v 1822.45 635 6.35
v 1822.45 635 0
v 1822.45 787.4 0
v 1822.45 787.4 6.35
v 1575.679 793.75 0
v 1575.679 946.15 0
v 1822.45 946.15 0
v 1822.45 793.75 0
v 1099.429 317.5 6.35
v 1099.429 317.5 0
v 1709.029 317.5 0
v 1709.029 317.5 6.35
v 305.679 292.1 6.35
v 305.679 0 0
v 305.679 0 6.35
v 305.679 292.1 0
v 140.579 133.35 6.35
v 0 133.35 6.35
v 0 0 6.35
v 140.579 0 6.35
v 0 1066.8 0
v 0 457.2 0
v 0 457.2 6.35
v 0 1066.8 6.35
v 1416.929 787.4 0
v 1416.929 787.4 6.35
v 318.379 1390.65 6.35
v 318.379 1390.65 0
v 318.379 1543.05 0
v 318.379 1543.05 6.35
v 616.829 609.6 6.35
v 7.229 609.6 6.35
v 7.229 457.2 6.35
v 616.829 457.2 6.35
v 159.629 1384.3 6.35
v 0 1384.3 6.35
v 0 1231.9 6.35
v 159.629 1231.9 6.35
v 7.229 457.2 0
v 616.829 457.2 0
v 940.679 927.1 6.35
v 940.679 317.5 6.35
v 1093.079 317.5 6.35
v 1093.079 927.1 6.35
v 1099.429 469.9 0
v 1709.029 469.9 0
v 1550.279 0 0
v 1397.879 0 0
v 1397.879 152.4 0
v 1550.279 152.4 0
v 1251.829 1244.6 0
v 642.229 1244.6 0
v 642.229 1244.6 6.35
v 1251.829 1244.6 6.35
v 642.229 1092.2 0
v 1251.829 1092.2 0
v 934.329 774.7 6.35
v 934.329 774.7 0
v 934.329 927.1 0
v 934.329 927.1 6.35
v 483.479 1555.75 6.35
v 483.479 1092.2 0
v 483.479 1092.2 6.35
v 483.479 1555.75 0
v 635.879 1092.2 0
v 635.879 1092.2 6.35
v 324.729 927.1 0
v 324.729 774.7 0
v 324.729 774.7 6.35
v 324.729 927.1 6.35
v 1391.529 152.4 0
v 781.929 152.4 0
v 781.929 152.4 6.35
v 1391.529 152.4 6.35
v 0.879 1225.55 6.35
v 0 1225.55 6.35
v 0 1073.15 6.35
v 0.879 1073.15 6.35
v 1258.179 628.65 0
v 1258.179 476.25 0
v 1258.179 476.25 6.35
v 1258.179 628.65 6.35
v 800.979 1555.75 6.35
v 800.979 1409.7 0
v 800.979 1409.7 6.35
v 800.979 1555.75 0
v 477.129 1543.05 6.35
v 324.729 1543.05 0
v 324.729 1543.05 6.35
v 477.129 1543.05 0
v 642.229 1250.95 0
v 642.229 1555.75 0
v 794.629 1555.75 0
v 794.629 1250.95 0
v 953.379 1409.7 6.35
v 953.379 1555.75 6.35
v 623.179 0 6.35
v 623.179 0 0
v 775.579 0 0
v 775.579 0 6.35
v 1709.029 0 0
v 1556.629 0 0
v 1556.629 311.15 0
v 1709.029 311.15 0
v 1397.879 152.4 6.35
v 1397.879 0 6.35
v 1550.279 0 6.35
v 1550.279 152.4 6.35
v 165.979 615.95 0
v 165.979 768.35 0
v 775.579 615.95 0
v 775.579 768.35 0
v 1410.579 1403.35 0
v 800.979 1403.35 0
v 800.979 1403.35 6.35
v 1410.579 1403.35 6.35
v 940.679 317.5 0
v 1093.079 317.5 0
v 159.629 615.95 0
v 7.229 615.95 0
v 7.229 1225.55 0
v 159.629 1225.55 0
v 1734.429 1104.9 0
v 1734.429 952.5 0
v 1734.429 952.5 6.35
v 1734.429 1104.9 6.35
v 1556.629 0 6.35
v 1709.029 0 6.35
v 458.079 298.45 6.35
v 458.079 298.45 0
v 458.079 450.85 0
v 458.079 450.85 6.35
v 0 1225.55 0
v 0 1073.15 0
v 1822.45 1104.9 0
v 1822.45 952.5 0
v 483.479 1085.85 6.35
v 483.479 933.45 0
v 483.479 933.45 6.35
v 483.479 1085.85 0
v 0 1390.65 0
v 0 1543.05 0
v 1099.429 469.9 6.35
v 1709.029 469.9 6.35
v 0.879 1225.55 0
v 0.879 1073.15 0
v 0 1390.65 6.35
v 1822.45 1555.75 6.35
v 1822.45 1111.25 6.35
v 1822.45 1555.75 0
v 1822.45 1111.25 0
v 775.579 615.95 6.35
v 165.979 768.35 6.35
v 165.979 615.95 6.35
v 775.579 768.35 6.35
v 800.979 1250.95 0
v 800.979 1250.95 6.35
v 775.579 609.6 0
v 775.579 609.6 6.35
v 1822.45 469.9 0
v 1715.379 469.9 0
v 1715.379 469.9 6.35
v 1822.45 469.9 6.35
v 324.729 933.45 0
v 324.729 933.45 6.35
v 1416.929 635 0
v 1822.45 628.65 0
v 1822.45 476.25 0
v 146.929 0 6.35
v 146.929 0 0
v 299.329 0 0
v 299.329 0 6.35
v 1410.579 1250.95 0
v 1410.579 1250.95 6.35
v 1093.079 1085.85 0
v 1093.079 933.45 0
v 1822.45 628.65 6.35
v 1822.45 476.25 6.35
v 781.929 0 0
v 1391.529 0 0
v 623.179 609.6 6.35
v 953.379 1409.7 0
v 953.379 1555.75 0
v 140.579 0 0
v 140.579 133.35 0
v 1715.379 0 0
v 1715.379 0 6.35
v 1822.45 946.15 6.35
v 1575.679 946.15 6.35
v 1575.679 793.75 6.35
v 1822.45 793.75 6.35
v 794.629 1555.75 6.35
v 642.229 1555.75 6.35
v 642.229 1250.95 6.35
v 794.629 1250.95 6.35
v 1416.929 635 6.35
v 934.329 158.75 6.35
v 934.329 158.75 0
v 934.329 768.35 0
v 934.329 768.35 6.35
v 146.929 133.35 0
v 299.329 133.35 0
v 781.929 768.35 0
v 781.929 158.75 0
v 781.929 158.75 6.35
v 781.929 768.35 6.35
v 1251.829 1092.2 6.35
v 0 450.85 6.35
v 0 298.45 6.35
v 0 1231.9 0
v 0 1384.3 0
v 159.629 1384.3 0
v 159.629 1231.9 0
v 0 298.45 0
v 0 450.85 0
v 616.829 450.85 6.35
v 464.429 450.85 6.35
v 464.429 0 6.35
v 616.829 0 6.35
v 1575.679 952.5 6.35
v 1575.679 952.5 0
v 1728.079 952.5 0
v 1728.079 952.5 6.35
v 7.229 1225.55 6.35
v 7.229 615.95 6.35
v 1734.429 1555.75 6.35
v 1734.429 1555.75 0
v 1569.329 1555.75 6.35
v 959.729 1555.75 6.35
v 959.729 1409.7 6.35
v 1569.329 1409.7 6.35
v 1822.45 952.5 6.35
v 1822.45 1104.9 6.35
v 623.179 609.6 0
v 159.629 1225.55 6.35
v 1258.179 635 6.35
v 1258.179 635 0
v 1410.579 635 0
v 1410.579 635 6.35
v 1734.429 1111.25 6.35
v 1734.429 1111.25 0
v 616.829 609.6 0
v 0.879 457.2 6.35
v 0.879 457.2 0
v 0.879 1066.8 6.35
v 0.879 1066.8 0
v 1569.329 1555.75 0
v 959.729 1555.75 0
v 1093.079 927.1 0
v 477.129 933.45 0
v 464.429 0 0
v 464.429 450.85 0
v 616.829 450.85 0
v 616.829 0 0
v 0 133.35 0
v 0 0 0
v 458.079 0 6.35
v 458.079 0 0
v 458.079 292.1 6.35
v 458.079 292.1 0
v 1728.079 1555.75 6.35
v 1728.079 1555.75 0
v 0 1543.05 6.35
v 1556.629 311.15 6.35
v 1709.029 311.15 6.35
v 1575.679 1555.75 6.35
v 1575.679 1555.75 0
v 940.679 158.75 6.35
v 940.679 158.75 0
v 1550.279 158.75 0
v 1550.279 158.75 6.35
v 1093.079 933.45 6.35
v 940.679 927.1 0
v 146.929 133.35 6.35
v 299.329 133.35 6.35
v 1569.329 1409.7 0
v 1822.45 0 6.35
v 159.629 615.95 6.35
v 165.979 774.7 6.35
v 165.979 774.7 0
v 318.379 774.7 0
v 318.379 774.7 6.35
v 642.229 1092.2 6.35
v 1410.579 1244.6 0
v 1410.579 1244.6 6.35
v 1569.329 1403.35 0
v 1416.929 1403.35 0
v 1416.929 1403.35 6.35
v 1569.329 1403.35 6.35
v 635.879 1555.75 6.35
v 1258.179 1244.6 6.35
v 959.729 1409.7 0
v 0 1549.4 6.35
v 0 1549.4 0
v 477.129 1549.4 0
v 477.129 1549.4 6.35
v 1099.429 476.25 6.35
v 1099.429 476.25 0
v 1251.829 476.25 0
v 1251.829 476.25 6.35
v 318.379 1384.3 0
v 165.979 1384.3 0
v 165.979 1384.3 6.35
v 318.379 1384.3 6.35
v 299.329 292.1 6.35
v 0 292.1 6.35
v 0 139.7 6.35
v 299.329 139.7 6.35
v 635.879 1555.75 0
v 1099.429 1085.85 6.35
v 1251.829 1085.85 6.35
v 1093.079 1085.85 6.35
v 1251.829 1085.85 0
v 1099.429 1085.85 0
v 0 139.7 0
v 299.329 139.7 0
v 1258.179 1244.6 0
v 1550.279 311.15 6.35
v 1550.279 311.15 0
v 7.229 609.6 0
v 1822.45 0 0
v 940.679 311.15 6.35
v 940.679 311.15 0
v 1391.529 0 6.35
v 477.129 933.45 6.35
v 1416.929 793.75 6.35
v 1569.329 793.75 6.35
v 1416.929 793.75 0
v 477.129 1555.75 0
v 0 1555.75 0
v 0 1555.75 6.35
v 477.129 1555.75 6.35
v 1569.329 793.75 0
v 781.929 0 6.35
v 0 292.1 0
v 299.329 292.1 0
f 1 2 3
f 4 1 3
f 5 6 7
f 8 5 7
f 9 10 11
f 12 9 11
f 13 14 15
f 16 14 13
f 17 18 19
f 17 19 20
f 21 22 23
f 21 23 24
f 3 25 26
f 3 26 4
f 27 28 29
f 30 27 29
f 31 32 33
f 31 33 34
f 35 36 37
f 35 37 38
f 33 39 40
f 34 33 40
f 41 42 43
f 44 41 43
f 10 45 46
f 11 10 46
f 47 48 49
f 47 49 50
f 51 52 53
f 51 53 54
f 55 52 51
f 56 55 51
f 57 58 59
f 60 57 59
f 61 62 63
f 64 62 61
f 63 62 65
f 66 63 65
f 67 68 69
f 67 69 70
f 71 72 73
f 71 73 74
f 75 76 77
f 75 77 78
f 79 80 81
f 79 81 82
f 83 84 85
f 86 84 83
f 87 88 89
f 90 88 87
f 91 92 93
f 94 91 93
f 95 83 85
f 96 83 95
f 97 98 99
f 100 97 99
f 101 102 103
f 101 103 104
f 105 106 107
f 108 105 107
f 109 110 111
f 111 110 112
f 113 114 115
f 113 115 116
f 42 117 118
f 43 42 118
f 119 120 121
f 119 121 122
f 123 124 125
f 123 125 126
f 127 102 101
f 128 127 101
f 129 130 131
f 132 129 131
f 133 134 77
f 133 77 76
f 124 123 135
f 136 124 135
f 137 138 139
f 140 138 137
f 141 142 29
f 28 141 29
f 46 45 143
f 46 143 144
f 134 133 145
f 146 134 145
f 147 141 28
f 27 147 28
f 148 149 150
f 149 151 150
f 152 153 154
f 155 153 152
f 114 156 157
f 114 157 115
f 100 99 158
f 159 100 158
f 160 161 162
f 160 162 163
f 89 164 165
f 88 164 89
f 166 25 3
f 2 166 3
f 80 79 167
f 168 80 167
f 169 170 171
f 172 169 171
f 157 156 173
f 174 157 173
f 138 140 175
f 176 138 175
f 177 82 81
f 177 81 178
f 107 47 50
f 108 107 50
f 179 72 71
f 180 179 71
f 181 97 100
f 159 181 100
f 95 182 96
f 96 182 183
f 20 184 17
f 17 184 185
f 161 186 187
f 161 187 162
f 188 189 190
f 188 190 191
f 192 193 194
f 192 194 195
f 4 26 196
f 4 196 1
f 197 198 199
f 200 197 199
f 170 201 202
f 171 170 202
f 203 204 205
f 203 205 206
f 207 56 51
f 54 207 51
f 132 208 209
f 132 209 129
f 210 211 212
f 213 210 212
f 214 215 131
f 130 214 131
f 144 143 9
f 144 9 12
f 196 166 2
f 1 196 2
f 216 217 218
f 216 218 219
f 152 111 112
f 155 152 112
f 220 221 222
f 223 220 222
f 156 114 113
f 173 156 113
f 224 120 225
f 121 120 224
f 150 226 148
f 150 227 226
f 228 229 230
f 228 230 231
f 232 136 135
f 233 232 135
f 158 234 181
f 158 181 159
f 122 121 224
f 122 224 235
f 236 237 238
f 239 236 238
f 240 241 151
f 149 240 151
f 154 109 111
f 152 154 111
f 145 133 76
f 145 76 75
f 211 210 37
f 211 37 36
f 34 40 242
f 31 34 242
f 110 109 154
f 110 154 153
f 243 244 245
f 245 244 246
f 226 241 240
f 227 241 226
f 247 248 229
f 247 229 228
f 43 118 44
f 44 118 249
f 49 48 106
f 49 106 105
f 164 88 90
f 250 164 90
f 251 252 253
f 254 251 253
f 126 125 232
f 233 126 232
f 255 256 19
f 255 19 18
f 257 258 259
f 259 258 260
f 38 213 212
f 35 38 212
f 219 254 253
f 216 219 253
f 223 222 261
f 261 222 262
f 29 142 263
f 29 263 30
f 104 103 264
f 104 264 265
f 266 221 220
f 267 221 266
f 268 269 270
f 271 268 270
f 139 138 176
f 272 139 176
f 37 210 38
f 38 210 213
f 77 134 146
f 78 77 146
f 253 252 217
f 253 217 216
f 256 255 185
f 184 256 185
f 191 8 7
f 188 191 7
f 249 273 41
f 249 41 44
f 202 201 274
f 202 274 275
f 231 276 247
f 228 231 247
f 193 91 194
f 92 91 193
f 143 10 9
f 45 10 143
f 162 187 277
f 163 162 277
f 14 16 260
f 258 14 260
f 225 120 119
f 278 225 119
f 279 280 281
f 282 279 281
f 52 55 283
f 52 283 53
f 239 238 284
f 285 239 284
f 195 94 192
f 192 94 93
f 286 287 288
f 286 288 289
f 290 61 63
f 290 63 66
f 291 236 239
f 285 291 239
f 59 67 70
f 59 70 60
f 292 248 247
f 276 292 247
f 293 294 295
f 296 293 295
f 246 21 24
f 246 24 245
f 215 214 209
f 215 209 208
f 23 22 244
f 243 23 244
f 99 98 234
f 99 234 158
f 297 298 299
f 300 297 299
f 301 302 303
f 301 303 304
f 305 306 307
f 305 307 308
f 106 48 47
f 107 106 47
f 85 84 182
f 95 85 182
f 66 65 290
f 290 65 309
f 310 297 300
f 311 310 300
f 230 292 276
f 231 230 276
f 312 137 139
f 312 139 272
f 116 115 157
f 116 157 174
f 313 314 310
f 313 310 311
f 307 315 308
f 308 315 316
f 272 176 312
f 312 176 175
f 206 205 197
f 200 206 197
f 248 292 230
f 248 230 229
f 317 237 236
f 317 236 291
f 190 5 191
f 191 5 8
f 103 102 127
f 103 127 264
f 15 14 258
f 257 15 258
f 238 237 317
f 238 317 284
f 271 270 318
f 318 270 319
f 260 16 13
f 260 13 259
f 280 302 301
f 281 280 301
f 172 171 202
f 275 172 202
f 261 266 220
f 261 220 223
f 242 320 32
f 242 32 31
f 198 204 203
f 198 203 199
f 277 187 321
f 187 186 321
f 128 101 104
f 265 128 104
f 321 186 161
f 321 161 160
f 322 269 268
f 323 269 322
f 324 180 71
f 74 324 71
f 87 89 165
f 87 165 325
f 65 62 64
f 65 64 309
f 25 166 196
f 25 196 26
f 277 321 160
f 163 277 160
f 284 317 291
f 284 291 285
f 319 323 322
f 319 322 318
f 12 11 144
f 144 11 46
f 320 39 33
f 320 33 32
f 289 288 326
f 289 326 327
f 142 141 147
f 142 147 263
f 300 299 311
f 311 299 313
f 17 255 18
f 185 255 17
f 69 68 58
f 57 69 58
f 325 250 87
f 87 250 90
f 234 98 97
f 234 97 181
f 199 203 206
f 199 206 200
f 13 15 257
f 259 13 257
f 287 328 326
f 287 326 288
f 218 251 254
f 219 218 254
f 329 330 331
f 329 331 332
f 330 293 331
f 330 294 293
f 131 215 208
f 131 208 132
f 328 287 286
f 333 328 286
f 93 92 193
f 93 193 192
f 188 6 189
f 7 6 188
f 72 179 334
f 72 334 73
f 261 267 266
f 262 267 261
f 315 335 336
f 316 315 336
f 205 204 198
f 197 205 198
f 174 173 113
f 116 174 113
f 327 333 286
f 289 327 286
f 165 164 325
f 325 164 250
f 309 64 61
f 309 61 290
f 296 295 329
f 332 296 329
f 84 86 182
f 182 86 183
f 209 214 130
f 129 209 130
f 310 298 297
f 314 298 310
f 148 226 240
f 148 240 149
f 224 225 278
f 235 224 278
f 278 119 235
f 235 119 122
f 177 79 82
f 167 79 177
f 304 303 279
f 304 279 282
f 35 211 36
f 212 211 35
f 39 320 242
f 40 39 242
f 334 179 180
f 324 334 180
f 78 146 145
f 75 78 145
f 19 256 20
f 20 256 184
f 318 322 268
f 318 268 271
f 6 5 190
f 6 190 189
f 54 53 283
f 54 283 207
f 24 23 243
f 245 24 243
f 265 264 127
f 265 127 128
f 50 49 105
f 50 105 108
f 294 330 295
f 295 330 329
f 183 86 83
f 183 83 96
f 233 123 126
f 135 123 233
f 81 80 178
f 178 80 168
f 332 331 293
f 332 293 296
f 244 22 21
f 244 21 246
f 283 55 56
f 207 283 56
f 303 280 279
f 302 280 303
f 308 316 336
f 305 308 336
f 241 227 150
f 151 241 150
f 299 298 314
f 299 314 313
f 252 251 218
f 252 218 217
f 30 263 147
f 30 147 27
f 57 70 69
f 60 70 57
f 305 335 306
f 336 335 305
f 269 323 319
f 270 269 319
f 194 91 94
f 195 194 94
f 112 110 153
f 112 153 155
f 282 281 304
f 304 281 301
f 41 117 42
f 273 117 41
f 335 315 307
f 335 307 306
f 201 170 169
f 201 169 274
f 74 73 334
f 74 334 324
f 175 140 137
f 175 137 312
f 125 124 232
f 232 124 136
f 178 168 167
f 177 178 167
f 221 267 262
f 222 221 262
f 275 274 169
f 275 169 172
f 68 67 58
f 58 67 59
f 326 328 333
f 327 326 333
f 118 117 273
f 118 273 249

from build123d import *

# Parameters (mm, degrees)
F1_W     = 609.6
F1_H     = 152.4
F1_W_2   = 152.4
F1_H_2   = 609.6
F2_DEPTH = 6.35
F3_W     = 4289.612889
F3_H     = 4005.097747
F3_W_2   = 1822.45
F3_H_2   = 1555.75
F4_DEPTH = 6.351


with BuildPart() as f2:
    # F1 (on Top) → F2 (new body)
    with BuildSketch(Plane.XY):
        with Locations((1086.728778, 76.2)):
            Rectangle(F1_W, F1_H)
        with Locations((858.128778, 463.55)):
            Rectangle(F1_W_2, F1_H_2)
        with Locations((1245.478778, 234.95)):
            Rectangle(F1_W, F1_H)
        with Locations((1016.878778, 622.3)):
            Rectangle(F1_W_2, F1_H_2)
        with Locations((699.378778, 304.8)):
            Rectangle(F1_W_2, F1_H_2)
        with Locations((312.028778, 533.4)):
            Rectangle(F1_W, F1_H)
        with Locations((540.628778, 146.05)):
            Rectangle(F1_W_2, F1_H_2)
        with Locations((153.278778, 374.65)):
            Rectangle(F1_W, F1_H)
        with Locations((381.878778, -12.7)):
            Rectangle(F1_W_2, F1_H_2)
        with Locations((-5.471222, 215.9)):
            Rectangle(F1_W, F1_H)
        with Locations((223.128778, -171.45)):
            Rectangle(F1_W_2, F1_H_2)
        with Locations((64.378778, -330.2)):
            Rectangle(F1_W_2, F1_H_2)
        with Locations((-164.221222, 57.15)):
            Rectangle(F1_W, F1_H)
        with Locations((470.778778, 692.15)):
            Rectangle(F1_W, F1_H)
        with Locations((629.528778, 850.9)):
            Rectangle(F1_W, F1_H)
        with Locations((788.278778, 1009.65)):
            Rectangle(F1_W, F1_H)
        with Locations((1404.228778, 393.7)):
            Rectangle(F1_W, F1_H)
        with Locations((1175.628778, 781.05)):
            Rectangle(F1_W_2, F1_H_2)
        with Locations((1562.978778, 552.45)):
            Rectangle(F1_W, F1_H)
        with Locations((1334.378778, 939.8)):
            Rectangle(F1_W_2, F1_H_2)
        with Locations((1721.728778, 711.2)):
            Rectangle(F1_W, F1_H)
        with Locations((947.028778, 1168.4)):
            Rectangle(F1_W, F1_H)
        with Locations((1493.128778, 1098.55)):
            Rectangle(F1_W_2, F1_H_2)
        with Locations((1880.478778, 869.95)):
            Rectangle(F1_W, F1_H)
        with Locations((1105.778778, 1327.15)):
            Rectangle(F1_W, F1_H)
        with Locations((718.428778, 1555.75)):
            Rectangle(F1_W_2, F1_H_2)
        with Locations((559.678778, 1397)):
            Rectangle(F1_W_2, F1_H_2)
        with Locations((400.928778, 1238.25)):
            Rectangle(F1_W_2, F1_H_2)
        with Locations((242.178778, 1079.5)):
            Rectangle(F1_W_2, F1_H_2)
        with Locations((83.428778, 920.75)):
            Rectangle(F1_W_2, F1_H_2)
        with Locations((-75.321222, 762)):
            Rectangle(F1_W_2, F1_H_2)
        with Locations((1474.078778, -152.4)):
            Rectangle(F1_W_2, F1_H_2)
        with Locations((1632.828778, 6.35)):
            Rectangle(F1_W_2, F1_H_2)
        with Locations((1791.578778, 165.1)):
            Rectangle(F1_W_2, F1_H_2)
        with Locations((-234.071222, 603.25)):
            Rectangle(F1_W_2, F1_H_2)
        with Locations((877.178778, 1714.5)):
            Rectangle(F1_W_2, F1_H_2)
        with Locations((1264.528778, 1485.9)):
            Rectangle(F1_W, F1_H)
        with Locations((-392.821222, 444.5)):
            Rectangle(F1_W_2, F1_H_2)
        with Locations((-621.421222, 831.85)):
            Rectangle(F1_W, F1_H)
        with Locations((-462.671222, 990.6)):
            Rectangle(F1_W, F1_H)
        with Locations((-303.921222, 1149.35)):
            Rectangle(F1_W, F1_H)
        with Locations((-145.171222, 1308.1)):
            Rectangle(F1_W, F1_H)
        with Locations((13.578778, 1466.85)):
            Rectangle(F1_W, F1_H)
        with Locations((172.328778, 1625.6)):
            Rectangle(F1_W, F1_H)
        with Locations((-215.021222, 1854.2)):
            Rectangle(F1_W_2, F1_H_2)
        with Locations((-373.771222, 1695.45)):
            Rectangle(F1_W_2, F1_H_2)
        with Locations((1651.878778, 1257.3)):
            Rectangle(F1_W_2, F1_H_2)
        with Locations((2039.228778, 1028.7)):
            Rectangle(F1_W, F1_H)
        with Locations((1810.628778, 1416.05)):
            Rectangle(F1_W_2, F1_H_2)
    extrude(amount=F2_DEPTH)

    # F3 (on Top) → F4 (cut, through all)
    with BuildSketch(Plane.XY):
        with Locations((857.388675, 780.000746)):
            Rectangle(F3_W, F3_H)
        with Locations((911.225, 777.875)):
            Rectangle(F3_W_2, F3_H_2, mode=Mode.SUBTRACT)
    extrude(amount=F4_DEPTH, mode=Mode.SUBTRACT)


solid = f2.part
